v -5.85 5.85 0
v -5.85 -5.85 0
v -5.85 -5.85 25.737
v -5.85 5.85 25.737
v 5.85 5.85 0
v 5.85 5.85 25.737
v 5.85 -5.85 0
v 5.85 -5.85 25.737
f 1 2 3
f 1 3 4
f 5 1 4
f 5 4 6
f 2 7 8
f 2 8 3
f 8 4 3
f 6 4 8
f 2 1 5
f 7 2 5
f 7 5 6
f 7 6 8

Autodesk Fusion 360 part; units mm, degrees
sketch "Sketch1" plane through (0, 0, 0) normal (0, 0, 1) x (1, 0, 0)
  line L0 (-5.85, 5.85) -> (5.85, 5.85)
  line L1 (5.85, 5.85) -> (5.85, -5.85)
  line L2 (5.85, -5.85) -> (-5.85, -5.85)
  line L3 (-5.85, -5.85) -> (-5.85, 5.85)
  line L4 (-5.85, 5.85) -> (5.85, -5.85) construction
  line L5 (5.85, 5.85) -> (-5.85, -5.85) construction
  line L6 (11.0385, 11.0385) -> (-11.0385, 11.0385)
  line L7 (-11.0385, 11.0385) -> (-11.0385, -11.0385)
  line L8 (-11.0385, -11.0385) -> (11.0385, -11.0385)
  line L9 (11.0385, -11.0385) -> (11.0385, 11.0385)
  line L10 (11.0385, 11.0385) -> (-11.0385, -11.0385) construction
  line L11 (-11.0385, 11.0385) -> (11.0385, -11.0385) construction
  dimension "d1" = 11.7
extrude "Extrude1" add sketch "Sketch1" against normal blind 10 makes body 1
extrude "Extrude2" add sketch "Sketch1" along normal blind 5 contours L0 L1 L2 L3 | L6 L7 L8 L9 bodies 1
extrude "Extrude3" add sketch "Sketch1" along normal blind 11 from surface at 5 contours L0 L1 L2 L3 bodies 1
chamfer "Chamfer1" distance 1 angle 45 1 faces at (1.95, -9.309, 5) on bodies 1
chamfer "Chamfer2" distance 1 angle 45 1 faces at (-1.95, 1.95, 0) on bodies 1
extrude "Extrude4" add sketch "Sketch1" along normal blind 22 separate body contours L0 L1 L2 L3 makes body 2
move_face "OffsetFaces1" offset 3.737 1 faces at (-1.95, 1.95, 22) on bodies 2
hidden bodies 1
